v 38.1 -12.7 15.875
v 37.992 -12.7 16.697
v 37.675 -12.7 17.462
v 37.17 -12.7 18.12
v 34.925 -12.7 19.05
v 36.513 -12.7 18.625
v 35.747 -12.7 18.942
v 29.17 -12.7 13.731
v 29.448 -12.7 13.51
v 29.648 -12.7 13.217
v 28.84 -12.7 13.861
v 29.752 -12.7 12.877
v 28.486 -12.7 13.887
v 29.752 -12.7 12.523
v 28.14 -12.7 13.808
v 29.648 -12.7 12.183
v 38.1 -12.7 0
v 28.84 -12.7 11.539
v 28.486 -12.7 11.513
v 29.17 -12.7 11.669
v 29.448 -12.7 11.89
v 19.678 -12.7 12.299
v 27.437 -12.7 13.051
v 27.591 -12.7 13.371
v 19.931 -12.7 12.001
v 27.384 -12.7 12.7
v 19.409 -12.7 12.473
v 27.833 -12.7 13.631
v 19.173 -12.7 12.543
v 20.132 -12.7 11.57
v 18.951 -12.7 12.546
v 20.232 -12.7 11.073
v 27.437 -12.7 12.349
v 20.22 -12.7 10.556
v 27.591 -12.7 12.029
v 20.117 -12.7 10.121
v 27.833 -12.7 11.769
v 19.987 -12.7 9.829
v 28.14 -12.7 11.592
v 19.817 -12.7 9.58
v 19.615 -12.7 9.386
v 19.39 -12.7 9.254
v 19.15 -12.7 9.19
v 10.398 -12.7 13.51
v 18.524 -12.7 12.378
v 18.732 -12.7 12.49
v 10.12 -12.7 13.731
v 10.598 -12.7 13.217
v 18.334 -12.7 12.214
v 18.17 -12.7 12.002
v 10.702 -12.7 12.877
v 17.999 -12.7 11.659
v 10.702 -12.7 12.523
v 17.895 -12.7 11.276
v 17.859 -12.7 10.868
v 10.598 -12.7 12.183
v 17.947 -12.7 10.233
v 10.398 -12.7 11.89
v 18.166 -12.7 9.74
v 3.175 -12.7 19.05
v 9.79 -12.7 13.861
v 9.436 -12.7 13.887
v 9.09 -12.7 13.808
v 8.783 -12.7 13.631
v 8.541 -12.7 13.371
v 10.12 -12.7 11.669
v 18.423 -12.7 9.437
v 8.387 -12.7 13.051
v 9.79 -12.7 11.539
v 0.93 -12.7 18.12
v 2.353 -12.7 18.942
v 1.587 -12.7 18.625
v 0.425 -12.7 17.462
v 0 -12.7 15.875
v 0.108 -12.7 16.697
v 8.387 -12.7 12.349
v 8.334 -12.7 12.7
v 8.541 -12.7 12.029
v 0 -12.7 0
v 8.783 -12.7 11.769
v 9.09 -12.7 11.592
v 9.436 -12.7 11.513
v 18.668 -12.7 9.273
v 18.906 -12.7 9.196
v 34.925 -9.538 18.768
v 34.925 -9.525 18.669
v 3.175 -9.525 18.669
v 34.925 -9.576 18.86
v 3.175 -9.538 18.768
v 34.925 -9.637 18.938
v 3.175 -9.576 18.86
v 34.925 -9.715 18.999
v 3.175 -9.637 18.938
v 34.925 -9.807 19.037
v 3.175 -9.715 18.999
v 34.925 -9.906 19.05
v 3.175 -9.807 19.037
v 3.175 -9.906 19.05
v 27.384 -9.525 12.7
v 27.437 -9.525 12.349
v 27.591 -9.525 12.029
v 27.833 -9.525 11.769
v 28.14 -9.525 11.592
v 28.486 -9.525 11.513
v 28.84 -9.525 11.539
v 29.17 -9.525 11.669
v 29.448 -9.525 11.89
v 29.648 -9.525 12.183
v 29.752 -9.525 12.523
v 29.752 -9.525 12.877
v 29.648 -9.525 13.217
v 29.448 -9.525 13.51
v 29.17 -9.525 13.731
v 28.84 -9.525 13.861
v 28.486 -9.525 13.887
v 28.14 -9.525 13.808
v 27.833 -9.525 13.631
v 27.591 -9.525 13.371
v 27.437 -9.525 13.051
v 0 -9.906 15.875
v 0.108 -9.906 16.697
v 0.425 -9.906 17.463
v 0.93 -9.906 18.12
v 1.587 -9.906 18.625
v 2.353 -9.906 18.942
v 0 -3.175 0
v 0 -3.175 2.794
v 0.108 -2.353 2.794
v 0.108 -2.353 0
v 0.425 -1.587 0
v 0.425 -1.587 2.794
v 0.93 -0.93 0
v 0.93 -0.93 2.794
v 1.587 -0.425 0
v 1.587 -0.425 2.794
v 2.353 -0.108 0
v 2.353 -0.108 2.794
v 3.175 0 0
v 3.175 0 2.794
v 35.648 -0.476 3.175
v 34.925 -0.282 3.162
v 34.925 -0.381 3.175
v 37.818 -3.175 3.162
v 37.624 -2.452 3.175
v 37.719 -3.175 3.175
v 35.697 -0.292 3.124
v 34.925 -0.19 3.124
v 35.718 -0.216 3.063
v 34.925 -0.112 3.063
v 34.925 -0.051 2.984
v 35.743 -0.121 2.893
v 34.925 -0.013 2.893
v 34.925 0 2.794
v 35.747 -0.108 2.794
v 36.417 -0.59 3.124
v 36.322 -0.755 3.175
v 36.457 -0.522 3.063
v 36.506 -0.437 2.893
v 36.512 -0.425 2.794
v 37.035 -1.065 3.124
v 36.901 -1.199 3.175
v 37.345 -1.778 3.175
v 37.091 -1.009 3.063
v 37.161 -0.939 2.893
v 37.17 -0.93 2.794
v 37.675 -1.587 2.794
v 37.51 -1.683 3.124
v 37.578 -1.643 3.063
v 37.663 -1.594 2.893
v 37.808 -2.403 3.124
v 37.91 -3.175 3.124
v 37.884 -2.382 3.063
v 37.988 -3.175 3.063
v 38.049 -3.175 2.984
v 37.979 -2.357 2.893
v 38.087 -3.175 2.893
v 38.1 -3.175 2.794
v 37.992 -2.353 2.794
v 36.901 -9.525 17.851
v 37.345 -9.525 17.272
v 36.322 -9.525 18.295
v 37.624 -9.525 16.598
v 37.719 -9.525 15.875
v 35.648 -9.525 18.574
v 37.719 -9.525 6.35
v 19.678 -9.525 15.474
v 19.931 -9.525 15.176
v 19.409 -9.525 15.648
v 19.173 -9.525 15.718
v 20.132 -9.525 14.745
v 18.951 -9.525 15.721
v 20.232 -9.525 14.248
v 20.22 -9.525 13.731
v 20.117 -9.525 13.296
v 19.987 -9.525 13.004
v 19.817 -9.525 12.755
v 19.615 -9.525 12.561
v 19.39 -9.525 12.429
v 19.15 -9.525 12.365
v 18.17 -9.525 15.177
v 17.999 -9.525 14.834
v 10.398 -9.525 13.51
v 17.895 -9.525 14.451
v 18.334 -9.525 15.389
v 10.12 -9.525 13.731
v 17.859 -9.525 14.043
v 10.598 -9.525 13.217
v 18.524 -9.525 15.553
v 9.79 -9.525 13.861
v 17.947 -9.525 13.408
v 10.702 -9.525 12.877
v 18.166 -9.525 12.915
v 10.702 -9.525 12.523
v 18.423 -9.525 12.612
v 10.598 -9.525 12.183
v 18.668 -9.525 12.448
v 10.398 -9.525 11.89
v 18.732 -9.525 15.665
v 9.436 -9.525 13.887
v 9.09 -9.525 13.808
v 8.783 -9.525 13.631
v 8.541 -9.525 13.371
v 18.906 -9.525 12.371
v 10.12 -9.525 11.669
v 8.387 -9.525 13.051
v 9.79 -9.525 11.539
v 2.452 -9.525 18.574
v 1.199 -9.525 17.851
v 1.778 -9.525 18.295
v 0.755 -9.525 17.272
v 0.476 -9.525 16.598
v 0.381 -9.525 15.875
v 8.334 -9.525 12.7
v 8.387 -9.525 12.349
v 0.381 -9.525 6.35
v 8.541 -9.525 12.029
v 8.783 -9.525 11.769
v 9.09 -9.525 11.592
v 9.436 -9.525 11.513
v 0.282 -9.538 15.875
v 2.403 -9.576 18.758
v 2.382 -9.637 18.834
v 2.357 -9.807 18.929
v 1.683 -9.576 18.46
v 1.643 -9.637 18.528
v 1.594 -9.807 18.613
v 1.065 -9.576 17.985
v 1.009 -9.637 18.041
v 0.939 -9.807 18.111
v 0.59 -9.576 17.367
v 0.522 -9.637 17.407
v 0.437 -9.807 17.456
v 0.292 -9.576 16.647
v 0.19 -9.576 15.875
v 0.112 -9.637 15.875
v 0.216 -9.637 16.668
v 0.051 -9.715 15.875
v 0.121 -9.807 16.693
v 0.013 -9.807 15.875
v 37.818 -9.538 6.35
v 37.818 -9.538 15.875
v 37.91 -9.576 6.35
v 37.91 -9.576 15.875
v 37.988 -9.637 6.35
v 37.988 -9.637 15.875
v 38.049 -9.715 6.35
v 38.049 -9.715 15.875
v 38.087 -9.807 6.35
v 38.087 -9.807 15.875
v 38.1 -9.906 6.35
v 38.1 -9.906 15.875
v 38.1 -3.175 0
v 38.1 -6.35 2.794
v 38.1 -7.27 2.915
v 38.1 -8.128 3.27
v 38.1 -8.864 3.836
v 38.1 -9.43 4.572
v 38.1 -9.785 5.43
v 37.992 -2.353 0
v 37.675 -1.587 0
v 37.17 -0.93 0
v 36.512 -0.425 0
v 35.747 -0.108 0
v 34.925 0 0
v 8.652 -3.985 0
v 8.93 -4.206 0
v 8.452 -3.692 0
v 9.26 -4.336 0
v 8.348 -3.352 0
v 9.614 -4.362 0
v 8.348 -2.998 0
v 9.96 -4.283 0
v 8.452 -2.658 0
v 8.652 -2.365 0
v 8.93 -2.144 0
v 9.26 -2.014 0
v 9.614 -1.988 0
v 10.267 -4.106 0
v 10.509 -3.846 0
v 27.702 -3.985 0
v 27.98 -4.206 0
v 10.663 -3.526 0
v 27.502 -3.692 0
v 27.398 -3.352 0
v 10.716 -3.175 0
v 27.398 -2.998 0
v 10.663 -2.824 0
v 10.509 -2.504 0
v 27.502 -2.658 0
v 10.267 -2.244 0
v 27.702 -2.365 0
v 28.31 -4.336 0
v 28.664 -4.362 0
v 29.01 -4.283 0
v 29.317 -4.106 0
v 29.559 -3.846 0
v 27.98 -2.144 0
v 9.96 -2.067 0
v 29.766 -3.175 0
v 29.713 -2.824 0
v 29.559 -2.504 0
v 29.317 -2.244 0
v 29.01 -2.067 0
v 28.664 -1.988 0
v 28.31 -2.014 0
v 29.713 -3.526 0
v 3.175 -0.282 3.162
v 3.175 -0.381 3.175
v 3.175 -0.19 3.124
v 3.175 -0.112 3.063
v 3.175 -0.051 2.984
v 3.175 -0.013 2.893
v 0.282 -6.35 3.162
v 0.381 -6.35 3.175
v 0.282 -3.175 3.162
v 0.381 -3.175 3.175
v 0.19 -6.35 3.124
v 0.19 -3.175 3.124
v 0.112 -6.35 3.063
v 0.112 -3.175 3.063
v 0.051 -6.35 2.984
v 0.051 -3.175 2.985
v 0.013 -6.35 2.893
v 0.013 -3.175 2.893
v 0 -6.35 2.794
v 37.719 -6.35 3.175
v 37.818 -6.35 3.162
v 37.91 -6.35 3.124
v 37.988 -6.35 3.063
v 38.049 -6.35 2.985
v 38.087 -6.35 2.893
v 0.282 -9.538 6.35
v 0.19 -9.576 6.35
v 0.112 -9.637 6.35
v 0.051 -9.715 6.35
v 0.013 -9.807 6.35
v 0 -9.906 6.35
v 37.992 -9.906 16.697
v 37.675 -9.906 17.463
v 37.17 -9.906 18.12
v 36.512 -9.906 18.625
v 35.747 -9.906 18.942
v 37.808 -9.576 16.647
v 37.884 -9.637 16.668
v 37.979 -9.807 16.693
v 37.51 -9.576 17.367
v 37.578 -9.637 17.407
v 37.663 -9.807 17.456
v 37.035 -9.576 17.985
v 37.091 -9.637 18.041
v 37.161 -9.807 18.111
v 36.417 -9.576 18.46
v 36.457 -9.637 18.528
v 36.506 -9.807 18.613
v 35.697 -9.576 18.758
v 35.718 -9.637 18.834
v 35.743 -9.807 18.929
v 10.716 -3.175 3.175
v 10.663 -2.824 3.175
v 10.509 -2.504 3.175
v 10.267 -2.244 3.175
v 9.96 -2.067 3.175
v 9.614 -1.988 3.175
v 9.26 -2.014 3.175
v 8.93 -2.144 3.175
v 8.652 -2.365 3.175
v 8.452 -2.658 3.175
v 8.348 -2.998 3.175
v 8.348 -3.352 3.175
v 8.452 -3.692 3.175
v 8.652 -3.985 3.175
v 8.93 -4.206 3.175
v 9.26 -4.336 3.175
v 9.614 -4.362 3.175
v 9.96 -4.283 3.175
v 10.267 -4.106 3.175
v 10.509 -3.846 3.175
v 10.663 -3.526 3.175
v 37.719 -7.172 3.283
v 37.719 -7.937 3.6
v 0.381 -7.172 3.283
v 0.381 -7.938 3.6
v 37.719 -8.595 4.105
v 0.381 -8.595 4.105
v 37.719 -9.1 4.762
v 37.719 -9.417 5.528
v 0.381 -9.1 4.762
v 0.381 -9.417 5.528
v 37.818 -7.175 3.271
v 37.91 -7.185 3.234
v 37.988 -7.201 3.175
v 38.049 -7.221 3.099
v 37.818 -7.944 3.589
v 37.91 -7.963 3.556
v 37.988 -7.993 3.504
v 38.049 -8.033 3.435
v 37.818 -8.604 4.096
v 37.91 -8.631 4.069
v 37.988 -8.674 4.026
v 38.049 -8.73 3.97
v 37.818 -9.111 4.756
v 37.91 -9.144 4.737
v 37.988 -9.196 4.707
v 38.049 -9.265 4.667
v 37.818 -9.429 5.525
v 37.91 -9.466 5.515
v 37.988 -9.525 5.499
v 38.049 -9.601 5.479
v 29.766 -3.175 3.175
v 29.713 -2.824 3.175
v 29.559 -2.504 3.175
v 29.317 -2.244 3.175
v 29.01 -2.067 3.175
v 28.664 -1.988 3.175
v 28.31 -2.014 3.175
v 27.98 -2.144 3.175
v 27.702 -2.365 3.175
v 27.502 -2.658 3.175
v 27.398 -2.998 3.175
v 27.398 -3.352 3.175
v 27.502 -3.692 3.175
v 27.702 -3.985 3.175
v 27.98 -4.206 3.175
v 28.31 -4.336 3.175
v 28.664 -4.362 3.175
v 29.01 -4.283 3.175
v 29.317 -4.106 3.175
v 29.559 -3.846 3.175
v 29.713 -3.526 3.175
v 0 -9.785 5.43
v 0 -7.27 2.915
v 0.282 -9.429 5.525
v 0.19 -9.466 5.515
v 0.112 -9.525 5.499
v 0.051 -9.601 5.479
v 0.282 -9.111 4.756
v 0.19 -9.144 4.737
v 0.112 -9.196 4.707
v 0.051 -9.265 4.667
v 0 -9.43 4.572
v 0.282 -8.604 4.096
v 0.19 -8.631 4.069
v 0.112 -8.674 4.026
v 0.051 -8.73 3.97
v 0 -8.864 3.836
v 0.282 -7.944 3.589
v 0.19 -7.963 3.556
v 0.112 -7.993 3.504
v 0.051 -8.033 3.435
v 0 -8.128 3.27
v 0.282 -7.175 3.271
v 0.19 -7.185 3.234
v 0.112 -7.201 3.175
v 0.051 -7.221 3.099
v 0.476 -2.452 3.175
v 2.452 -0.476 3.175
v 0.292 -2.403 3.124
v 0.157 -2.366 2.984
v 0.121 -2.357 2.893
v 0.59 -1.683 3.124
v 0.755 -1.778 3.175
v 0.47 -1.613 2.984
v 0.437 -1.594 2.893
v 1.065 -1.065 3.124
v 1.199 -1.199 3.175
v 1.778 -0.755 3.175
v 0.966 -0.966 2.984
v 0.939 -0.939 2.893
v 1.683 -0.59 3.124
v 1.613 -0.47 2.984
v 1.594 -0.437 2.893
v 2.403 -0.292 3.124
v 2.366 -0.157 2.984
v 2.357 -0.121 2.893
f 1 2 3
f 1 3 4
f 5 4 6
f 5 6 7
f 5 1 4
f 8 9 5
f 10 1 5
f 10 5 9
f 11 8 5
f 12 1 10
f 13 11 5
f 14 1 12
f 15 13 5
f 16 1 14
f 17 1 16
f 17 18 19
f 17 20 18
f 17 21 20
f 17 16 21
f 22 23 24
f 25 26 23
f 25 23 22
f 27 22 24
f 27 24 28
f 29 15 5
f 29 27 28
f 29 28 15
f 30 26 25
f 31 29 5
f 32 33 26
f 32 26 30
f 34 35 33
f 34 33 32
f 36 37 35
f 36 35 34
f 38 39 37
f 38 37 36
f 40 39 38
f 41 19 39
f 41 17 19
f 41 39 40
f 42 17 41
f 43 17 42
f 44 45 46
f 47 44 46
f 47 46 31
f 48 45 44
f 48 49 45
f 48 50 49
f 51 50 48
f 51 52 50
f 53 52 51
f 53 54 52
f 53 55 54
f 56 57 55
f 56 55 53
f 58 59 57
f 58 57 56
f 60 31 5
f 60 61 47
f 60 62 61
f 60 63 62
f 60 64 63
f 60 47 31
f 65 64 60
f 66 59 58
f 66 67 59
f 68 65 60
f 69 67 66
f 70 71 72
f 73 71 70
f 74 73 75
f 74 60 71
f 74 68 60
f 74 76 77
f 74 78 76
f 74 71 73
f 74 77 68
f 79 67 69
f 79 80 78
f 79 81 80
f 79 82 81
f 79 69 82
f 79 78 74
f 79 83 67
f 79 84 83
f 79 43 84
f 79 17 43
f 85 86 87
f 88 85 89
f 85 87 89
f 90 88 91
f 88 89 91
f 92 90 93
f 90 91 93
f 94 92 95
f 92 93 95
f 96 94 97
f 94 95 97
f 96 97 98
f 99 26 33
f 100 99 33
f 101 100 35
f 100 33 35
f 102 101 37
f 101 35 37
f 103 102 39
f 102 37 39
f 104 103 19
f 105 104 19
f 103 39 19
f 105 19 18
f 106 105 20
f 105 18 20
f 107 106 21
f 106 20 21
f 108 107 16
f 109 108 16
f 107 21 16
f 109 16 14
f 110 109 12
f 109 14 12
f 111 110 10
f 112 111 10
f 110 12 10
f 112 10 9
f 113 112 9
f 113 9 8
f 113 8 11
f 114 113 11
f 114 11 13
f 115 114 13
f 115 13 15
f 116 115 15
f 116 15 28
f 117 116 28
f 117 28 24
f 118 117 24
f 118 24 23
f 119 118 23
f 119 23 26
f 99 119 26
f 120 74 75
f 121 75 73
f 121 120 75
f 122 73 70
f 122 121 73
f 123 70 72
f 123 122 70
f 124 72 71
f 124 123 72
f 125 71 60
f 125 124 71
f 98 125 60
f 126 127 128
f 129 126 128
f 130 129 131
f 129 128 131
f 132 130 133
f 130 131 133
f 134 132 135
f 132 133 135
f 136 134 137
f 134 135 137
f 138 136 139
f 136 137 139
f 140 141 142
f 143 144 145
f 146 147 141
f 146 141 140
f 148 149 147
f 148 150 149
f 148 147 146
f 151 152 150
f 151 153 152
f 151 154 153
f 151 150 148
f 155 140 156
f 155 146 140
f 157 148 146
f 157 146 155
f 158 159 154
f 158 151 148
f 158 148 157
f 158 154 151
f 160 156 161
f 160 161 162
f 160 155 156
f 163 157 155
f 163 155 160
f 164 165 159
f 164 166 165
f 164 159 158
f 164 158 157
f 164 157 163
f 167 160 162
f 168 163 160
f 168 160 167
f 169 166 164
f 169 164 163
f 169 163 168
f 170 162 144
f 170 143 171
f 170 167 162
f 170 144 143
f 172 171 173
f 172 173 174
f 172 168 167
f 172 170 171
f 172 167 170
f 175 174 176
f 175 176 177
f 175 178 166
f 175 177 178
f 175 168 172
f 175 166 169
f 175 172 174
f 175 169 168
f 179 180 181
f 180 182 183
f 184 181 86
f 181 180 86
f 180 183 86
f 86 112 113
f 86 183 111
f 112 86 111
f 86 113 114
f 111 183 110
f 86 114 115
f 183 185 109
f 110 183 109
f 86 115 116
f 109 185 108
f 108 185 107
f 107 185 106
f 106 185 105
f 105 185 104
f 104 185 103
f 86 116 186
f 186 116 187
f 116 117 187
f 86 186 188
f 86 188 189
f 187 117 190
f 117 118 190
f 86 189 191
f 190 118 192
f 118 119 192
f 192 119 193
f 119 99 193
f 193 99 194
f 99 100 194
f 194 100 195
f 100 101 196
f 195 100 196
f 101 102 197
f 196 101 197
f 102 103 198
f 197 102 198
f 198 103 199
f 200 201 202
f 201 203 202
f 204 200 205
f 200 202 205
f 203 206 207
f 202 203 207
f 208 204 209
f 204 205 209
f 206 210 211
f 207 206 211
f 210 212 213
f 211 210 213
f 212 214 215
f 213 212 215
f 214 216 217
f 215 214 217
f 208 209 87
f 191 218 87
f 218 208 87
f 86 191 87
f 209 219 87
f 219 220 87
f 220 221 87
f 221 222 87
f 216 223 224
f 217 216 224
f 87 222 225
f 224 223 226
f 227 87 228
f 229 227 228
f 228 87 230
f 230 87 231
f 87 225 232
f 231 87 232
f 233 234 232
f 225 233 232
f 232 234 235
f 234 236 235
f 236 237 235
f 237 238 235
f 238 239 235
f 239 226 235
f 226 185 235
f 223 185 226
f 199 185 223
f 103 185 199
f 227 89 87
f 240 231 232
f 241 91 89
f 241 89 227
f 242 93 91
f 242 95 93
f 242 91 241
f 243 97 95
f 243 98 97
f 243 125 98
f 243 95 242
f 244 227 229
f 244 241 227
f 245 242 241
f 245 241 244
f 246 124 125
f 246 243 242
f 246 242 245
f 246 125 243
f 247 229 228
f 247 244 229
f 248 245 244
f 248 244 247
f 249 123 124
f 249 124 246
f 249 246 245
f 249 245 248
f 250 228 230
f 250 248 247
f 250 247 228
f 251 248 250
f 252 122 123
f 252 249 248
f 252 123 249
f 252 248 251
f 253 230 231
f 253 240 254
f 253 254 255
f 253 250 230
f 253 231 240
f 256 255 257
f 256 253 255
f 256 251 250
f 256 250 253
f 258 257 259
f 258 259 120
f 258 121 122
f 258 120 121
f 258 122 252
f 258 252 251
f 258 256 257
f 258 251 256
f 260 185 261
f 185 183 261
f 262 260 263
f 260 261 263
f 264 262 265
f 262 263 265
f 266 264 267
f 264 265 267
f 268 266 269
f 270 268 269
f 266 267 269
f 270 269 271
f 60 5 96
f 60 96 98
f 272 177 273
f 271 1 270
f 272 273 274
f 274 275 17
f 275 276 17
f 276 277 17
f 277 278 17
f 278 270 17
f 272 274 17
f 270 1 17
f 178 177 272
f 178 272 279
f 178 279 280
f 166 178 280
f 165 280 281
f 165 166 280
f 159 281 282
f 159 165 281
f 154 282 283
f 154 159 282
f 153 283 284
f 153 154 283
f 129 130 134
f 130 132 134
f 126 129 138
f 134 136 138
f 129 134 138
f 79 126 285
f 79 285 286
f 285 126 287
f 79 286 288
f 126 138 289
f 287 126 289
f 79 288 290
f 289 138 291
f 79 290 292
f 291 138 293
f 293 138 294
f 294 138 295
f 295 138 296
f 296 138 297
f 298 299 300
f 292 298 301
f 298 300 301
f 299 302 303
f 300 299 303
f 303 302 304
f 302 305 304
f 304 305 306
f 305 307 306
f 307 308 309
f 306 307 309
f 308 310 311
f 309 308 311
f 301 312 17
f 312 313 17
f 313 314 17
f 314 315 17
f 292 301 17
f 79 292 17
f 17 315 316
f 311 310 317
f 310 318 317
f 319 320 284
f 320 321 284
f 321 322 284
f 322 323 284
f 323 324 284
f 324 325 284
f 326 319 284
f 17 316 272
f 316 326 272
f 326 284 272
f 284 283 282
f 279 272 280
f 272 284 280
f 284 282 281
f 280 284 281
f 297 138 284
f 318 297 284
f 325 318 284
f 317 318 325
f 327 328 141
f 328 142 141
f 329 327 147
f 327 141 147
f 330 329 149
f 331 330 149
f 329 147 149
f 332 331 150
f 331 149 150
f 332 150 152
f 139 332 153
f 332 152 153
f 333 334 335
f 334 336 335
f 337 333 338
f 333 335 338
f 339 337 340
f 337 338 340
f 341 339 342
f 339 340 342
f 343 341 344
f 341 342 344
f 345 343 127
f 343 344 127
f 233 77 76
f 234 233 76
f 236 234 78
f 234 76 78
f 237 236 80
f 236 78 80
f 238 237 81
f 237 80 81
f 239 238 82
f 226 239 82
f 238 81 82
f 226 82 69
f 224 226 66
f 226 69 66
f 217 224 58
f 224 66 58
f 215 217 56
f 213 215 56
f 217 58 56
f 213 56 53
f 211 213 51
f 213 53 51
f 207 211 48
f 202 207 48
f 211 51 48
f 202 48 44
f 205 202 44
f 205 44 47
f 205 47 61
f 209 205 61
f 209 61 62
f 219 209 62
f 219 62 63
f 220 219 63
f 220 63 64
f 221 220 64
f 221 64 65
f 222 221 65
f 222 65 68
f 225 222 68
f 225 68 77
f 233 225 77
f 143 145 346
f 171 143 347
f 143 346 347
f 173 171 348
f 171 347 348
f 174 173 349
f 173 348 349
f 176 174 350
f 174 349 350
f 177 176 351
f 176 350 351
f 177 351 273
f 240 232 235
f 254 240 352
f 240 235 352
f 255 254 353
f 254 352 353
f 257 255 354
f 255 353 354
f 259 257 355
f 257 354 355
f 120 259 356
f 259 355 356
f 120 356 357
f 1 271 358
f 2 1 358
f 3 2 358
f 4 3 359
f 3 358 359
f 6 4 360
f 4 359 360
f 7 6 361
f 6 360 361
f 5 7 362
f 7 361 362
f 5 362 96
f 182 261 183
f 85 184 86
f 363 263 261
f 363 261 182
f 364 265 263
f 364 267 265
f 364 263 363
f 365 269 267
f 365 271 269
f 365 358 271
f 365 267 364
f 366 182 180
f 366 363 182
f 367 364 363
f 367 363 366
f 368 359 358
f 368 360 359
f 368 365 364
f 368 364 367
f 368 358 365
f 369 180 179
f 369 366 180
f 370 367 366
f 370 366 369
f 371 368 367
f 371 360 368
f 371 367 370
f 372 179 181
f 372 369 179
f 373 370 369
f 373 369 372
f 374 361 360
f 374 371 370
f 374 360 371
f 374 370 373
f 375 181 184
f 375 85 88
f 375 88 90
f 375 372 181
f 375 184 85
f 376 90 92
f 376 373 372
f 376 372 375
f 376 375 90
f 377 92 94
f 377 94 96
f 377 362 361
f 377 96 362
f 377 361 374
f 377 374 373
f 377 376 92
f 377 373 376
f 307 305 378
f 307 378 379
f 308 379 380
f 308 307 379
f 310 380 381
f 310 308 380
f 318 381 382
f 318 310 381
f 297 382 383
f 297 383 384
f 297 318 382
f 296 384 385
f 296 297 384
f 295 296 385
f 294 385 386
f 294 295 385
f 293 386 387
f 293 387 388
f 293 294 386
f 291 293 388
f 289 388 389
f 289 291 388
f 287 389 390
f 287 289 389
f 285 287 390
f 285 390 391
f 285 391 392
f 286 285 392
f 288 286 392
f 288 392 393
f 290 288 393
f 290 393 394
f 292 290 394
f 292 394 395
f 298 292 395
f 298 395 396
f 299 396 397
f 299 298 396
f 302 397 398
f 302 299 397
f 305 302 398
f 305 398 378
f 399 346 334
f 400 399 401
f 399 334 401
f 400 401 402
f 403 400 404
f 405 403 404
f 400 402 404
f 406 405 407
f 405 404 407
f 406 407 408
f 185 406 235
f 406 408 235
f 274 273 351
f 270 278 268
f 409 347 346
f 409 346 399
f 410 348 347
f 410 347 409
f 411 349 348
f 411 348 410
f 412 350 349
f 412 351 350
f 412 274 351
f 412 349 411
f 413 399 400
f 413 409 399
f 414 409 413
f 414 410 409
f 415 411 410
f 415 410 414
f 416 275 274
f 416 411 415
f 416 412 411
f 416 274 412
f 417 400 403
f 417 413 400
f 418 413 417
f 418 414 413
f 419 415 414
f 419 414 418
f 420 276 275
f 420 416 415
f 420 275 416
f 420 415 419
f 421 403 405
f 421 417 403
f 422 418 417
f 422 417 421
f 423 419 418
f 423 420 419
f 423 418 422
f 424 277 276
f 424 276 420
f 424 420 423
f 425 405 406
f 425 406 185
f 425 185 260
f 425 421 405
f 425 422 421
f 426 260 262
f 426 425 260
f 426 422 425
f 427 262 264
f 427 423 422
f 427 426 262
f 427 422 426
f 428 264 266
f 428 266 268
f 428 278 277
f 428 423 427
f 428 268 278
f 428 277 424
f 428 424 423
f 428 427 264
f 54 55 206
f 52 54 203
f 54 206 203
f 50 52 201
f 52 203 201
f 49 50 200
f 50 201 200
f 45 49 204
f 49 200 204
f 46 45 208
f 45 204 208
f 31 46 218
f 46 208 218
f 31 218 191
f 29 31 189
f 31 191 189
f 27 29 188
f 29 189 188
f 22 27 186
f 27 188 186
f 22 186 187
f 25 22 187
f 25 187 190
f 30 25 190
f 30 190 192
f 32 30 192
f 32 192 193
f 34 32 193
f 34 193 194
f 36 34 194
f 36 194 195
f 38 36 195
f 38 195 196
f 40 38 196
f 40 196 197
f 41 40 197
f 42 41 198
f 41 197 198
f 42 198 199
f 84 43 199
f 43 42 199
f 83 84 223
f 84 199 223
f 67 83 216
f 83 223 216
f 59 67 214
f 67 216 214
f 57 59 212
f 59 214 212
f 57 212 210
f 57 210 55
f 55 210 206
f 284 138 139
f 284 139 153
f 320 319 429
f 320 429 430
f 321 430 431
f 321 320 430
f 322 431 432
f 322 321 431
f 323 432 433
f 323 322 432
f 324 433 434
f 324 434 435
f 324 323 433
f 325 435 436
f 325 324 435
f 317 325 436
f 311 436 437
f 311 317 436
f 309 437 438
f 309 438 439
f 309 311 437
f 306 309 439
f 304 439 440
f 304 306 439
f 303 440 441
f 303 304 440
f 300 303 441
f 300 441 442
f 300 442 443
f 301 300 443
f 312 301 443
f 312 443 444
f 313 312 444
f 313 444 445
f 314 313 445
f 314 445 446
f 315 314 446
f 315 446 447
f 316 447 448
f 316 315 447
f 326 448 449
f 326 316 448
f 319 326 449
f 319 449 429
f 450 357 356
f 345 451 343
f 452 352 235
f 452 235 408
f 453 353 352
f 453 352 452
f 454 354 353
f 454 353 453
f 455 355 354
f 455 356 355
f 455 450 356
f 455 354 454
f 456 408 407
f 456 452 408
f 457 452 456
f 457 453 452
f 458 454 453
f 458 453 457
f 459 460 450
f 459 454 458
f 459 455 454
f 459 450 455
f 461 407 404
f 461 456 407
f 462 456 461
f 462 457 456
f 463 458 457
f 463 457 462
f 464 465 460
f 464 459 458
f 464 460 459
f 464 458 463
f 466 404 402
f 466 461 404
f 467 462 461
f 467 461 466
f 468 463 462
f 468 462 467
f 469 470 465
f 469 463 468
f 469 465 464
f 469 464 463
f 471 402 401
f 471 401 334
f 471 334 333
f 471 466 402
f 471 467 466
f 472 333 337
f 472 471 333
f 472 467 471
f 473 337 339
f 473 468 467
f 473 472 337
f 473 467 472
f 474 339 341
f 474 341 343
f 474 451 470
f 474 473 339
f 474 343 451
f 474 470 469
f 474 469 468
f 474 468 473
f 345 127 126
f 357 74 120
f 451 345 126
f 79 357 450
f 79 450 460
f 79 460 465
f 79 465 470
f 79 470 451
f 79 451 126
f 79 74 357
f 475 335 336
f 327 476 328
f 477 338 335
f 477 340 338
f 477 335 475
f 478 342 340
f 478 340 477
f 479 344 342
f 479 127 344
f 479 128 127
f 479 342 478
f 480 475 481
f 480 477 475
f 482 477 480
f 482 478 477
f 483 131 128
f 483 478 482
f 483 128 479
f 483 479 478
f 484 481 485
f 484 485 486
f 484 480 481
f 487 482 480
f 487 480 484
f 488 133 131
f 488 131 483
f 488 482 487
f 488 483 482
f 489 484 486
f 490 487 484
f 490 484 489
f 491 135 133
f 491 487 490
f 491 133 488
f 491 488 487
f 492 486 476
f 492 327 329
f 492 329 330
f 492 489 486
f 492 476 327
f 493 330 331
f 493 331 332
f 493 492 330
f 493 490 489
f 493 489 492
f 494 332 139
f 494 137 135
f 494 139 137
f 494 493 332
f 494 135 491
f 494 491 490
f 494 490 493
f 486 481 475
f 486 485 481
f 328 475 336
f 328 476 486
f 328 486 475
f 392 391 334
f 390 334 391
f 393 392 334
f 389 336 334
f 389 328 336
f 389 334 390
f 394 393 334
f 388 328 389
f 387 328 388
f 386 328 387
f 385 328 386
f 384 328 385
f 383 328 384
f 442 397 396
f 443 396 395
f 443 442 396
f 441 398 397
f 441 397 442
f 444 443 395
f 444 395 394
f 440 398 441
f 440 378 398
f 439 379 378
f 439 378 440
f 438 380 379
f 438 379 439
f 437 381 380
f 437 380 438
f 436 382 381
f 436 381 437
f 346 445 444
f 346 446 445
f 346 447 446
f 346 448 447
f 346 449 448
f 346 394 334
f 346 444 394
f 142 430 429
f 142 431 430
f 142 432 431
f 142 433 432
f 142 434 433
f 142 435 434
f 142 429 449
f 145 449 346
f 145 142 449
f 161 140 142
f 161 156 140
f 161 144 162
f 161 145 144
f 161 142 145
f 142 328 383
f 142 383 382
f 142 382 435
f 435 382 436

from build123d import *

# Parameters (mm, degrees)
SKETCH1_W           = 38.1
SKETCH1_H           = 12.7
SKETCH1_R           = 1.190625
BOSS_EXTRUDE1_DEPTH = 3.175
SKETCH2_W           = 38.1
SKETCH2_H           = 15.875
BOSS_EXTRUDE2_DEPTH = 3.175
FILLET1_R           = 3.175
FILLET2_R           = 0.381
SKETCH3_R           = 1.190625
CUT_EXTRUDE1_DEPTH  = 16.557632845
SKETCH4_R           = 1.190625
CUT_EXTRUDE2_DEPTH  = 13.7


with BuildPart() as part:
    # Sketch1 → Boss-Extrude1 (new body)
    with BuildSketch(Plane.XY):
        with Locations((19.05, -6.35)):
            Rectangle(SKETCH1_W, SKETCH1_H)
        with Locations((9.525, -3.175)):
            Circle(SKETCH1_R, mode=Mode.SUBTRACT)
        with Locations((28.575, -3.175)):
            Circle(SKETCH1_R, mode=Mode.SUBTRACT)
    extrude(amount=BOSS_EXTRUDE1_DEPTH)

    # Sketch2 → Boss-Extrude2 (add)
    with BuildSketch(Plane(origin=(0, -12.7, 0), x_dir=(-1, 0, 0), z_dir=(0, -1, 0))):
        with Locations((-19.05, -11.1125)):
            Rectangle(SKETCH2_W, SKETCH2_H)
    extrude(amount=-BOSS_EXTRUDE2_DEPTH)

    # Fillet1
    fillet1_edges = [part.edges().sort_by_distance(p)[0] for p in [
        (38.1, 0, 1.5875),
        (0, 0, 1.5875),
        (19.05, -9.525, 3.175),
        (38.1, -11.1125, 19.05),
        (0, -11.1125, 19.05),
    ]]
    fillet(fillet1_edges, radius=FILLET1_R)

    # Fillet2
    fillet2_edges = [part.edges().sort_by_distance(p)[0] for p in [
        (19.05, 0, 3.175),
        (38.1, -4.7625, 3.175),
        (38.1, -9.525, 11.1125),
        (0, -4.7625, 3.175),
        (0.92993597, -0.92993597, 3.175),
        (37.17006403, -0.92993597, 3.175),
        (0, -9.525, 11.1125),
        (19.05, -9.525, 19.05),
        (0.92993597, -9.525, 18.12006403),
        (37.17006403, -9.525, 18.12006403),
        (38.1, -8.59506403, 4.10493597),
        (0, -8.59506403, 4.10493597),
    ]]
    fillet(fillet2_edges, radius=FILLET2_R)

    # Sketch3 → Cut-Extrude1 (cut, through all)
    with BuildSketch(Plane(origin=(0, 4.650907684, 4.650907684), x_dir=(-1, 0, 0), z_dir=(0, 0.707106781, 0.707106781))):
        with Locations((-19.05, 16.664983956)):
            Circle(SKETCH3_R)
    extrude(amount=-CUT_EXTRUDE1_DEPTH, mode=Mode.SUBTRACT)

    # Sketch4 → Cut-Extrude2 (cut, through all)
    with BuildSketch(Plane(origin=(0, -12.7, 0), x_dir=(-1, 0, 0), z_dir=(0, -1, 0))):
        with Locations((-9.525, -12.7)):
            Circle(SKETCH4_R)
        with Locations((-28.575, -12.7)):
            Circle(SKETCH4_R)
    extrude(amount=-CUT_EXTRUDE2_DEPTH, mode=Mode.SUBTRACT)


solid = part.part
